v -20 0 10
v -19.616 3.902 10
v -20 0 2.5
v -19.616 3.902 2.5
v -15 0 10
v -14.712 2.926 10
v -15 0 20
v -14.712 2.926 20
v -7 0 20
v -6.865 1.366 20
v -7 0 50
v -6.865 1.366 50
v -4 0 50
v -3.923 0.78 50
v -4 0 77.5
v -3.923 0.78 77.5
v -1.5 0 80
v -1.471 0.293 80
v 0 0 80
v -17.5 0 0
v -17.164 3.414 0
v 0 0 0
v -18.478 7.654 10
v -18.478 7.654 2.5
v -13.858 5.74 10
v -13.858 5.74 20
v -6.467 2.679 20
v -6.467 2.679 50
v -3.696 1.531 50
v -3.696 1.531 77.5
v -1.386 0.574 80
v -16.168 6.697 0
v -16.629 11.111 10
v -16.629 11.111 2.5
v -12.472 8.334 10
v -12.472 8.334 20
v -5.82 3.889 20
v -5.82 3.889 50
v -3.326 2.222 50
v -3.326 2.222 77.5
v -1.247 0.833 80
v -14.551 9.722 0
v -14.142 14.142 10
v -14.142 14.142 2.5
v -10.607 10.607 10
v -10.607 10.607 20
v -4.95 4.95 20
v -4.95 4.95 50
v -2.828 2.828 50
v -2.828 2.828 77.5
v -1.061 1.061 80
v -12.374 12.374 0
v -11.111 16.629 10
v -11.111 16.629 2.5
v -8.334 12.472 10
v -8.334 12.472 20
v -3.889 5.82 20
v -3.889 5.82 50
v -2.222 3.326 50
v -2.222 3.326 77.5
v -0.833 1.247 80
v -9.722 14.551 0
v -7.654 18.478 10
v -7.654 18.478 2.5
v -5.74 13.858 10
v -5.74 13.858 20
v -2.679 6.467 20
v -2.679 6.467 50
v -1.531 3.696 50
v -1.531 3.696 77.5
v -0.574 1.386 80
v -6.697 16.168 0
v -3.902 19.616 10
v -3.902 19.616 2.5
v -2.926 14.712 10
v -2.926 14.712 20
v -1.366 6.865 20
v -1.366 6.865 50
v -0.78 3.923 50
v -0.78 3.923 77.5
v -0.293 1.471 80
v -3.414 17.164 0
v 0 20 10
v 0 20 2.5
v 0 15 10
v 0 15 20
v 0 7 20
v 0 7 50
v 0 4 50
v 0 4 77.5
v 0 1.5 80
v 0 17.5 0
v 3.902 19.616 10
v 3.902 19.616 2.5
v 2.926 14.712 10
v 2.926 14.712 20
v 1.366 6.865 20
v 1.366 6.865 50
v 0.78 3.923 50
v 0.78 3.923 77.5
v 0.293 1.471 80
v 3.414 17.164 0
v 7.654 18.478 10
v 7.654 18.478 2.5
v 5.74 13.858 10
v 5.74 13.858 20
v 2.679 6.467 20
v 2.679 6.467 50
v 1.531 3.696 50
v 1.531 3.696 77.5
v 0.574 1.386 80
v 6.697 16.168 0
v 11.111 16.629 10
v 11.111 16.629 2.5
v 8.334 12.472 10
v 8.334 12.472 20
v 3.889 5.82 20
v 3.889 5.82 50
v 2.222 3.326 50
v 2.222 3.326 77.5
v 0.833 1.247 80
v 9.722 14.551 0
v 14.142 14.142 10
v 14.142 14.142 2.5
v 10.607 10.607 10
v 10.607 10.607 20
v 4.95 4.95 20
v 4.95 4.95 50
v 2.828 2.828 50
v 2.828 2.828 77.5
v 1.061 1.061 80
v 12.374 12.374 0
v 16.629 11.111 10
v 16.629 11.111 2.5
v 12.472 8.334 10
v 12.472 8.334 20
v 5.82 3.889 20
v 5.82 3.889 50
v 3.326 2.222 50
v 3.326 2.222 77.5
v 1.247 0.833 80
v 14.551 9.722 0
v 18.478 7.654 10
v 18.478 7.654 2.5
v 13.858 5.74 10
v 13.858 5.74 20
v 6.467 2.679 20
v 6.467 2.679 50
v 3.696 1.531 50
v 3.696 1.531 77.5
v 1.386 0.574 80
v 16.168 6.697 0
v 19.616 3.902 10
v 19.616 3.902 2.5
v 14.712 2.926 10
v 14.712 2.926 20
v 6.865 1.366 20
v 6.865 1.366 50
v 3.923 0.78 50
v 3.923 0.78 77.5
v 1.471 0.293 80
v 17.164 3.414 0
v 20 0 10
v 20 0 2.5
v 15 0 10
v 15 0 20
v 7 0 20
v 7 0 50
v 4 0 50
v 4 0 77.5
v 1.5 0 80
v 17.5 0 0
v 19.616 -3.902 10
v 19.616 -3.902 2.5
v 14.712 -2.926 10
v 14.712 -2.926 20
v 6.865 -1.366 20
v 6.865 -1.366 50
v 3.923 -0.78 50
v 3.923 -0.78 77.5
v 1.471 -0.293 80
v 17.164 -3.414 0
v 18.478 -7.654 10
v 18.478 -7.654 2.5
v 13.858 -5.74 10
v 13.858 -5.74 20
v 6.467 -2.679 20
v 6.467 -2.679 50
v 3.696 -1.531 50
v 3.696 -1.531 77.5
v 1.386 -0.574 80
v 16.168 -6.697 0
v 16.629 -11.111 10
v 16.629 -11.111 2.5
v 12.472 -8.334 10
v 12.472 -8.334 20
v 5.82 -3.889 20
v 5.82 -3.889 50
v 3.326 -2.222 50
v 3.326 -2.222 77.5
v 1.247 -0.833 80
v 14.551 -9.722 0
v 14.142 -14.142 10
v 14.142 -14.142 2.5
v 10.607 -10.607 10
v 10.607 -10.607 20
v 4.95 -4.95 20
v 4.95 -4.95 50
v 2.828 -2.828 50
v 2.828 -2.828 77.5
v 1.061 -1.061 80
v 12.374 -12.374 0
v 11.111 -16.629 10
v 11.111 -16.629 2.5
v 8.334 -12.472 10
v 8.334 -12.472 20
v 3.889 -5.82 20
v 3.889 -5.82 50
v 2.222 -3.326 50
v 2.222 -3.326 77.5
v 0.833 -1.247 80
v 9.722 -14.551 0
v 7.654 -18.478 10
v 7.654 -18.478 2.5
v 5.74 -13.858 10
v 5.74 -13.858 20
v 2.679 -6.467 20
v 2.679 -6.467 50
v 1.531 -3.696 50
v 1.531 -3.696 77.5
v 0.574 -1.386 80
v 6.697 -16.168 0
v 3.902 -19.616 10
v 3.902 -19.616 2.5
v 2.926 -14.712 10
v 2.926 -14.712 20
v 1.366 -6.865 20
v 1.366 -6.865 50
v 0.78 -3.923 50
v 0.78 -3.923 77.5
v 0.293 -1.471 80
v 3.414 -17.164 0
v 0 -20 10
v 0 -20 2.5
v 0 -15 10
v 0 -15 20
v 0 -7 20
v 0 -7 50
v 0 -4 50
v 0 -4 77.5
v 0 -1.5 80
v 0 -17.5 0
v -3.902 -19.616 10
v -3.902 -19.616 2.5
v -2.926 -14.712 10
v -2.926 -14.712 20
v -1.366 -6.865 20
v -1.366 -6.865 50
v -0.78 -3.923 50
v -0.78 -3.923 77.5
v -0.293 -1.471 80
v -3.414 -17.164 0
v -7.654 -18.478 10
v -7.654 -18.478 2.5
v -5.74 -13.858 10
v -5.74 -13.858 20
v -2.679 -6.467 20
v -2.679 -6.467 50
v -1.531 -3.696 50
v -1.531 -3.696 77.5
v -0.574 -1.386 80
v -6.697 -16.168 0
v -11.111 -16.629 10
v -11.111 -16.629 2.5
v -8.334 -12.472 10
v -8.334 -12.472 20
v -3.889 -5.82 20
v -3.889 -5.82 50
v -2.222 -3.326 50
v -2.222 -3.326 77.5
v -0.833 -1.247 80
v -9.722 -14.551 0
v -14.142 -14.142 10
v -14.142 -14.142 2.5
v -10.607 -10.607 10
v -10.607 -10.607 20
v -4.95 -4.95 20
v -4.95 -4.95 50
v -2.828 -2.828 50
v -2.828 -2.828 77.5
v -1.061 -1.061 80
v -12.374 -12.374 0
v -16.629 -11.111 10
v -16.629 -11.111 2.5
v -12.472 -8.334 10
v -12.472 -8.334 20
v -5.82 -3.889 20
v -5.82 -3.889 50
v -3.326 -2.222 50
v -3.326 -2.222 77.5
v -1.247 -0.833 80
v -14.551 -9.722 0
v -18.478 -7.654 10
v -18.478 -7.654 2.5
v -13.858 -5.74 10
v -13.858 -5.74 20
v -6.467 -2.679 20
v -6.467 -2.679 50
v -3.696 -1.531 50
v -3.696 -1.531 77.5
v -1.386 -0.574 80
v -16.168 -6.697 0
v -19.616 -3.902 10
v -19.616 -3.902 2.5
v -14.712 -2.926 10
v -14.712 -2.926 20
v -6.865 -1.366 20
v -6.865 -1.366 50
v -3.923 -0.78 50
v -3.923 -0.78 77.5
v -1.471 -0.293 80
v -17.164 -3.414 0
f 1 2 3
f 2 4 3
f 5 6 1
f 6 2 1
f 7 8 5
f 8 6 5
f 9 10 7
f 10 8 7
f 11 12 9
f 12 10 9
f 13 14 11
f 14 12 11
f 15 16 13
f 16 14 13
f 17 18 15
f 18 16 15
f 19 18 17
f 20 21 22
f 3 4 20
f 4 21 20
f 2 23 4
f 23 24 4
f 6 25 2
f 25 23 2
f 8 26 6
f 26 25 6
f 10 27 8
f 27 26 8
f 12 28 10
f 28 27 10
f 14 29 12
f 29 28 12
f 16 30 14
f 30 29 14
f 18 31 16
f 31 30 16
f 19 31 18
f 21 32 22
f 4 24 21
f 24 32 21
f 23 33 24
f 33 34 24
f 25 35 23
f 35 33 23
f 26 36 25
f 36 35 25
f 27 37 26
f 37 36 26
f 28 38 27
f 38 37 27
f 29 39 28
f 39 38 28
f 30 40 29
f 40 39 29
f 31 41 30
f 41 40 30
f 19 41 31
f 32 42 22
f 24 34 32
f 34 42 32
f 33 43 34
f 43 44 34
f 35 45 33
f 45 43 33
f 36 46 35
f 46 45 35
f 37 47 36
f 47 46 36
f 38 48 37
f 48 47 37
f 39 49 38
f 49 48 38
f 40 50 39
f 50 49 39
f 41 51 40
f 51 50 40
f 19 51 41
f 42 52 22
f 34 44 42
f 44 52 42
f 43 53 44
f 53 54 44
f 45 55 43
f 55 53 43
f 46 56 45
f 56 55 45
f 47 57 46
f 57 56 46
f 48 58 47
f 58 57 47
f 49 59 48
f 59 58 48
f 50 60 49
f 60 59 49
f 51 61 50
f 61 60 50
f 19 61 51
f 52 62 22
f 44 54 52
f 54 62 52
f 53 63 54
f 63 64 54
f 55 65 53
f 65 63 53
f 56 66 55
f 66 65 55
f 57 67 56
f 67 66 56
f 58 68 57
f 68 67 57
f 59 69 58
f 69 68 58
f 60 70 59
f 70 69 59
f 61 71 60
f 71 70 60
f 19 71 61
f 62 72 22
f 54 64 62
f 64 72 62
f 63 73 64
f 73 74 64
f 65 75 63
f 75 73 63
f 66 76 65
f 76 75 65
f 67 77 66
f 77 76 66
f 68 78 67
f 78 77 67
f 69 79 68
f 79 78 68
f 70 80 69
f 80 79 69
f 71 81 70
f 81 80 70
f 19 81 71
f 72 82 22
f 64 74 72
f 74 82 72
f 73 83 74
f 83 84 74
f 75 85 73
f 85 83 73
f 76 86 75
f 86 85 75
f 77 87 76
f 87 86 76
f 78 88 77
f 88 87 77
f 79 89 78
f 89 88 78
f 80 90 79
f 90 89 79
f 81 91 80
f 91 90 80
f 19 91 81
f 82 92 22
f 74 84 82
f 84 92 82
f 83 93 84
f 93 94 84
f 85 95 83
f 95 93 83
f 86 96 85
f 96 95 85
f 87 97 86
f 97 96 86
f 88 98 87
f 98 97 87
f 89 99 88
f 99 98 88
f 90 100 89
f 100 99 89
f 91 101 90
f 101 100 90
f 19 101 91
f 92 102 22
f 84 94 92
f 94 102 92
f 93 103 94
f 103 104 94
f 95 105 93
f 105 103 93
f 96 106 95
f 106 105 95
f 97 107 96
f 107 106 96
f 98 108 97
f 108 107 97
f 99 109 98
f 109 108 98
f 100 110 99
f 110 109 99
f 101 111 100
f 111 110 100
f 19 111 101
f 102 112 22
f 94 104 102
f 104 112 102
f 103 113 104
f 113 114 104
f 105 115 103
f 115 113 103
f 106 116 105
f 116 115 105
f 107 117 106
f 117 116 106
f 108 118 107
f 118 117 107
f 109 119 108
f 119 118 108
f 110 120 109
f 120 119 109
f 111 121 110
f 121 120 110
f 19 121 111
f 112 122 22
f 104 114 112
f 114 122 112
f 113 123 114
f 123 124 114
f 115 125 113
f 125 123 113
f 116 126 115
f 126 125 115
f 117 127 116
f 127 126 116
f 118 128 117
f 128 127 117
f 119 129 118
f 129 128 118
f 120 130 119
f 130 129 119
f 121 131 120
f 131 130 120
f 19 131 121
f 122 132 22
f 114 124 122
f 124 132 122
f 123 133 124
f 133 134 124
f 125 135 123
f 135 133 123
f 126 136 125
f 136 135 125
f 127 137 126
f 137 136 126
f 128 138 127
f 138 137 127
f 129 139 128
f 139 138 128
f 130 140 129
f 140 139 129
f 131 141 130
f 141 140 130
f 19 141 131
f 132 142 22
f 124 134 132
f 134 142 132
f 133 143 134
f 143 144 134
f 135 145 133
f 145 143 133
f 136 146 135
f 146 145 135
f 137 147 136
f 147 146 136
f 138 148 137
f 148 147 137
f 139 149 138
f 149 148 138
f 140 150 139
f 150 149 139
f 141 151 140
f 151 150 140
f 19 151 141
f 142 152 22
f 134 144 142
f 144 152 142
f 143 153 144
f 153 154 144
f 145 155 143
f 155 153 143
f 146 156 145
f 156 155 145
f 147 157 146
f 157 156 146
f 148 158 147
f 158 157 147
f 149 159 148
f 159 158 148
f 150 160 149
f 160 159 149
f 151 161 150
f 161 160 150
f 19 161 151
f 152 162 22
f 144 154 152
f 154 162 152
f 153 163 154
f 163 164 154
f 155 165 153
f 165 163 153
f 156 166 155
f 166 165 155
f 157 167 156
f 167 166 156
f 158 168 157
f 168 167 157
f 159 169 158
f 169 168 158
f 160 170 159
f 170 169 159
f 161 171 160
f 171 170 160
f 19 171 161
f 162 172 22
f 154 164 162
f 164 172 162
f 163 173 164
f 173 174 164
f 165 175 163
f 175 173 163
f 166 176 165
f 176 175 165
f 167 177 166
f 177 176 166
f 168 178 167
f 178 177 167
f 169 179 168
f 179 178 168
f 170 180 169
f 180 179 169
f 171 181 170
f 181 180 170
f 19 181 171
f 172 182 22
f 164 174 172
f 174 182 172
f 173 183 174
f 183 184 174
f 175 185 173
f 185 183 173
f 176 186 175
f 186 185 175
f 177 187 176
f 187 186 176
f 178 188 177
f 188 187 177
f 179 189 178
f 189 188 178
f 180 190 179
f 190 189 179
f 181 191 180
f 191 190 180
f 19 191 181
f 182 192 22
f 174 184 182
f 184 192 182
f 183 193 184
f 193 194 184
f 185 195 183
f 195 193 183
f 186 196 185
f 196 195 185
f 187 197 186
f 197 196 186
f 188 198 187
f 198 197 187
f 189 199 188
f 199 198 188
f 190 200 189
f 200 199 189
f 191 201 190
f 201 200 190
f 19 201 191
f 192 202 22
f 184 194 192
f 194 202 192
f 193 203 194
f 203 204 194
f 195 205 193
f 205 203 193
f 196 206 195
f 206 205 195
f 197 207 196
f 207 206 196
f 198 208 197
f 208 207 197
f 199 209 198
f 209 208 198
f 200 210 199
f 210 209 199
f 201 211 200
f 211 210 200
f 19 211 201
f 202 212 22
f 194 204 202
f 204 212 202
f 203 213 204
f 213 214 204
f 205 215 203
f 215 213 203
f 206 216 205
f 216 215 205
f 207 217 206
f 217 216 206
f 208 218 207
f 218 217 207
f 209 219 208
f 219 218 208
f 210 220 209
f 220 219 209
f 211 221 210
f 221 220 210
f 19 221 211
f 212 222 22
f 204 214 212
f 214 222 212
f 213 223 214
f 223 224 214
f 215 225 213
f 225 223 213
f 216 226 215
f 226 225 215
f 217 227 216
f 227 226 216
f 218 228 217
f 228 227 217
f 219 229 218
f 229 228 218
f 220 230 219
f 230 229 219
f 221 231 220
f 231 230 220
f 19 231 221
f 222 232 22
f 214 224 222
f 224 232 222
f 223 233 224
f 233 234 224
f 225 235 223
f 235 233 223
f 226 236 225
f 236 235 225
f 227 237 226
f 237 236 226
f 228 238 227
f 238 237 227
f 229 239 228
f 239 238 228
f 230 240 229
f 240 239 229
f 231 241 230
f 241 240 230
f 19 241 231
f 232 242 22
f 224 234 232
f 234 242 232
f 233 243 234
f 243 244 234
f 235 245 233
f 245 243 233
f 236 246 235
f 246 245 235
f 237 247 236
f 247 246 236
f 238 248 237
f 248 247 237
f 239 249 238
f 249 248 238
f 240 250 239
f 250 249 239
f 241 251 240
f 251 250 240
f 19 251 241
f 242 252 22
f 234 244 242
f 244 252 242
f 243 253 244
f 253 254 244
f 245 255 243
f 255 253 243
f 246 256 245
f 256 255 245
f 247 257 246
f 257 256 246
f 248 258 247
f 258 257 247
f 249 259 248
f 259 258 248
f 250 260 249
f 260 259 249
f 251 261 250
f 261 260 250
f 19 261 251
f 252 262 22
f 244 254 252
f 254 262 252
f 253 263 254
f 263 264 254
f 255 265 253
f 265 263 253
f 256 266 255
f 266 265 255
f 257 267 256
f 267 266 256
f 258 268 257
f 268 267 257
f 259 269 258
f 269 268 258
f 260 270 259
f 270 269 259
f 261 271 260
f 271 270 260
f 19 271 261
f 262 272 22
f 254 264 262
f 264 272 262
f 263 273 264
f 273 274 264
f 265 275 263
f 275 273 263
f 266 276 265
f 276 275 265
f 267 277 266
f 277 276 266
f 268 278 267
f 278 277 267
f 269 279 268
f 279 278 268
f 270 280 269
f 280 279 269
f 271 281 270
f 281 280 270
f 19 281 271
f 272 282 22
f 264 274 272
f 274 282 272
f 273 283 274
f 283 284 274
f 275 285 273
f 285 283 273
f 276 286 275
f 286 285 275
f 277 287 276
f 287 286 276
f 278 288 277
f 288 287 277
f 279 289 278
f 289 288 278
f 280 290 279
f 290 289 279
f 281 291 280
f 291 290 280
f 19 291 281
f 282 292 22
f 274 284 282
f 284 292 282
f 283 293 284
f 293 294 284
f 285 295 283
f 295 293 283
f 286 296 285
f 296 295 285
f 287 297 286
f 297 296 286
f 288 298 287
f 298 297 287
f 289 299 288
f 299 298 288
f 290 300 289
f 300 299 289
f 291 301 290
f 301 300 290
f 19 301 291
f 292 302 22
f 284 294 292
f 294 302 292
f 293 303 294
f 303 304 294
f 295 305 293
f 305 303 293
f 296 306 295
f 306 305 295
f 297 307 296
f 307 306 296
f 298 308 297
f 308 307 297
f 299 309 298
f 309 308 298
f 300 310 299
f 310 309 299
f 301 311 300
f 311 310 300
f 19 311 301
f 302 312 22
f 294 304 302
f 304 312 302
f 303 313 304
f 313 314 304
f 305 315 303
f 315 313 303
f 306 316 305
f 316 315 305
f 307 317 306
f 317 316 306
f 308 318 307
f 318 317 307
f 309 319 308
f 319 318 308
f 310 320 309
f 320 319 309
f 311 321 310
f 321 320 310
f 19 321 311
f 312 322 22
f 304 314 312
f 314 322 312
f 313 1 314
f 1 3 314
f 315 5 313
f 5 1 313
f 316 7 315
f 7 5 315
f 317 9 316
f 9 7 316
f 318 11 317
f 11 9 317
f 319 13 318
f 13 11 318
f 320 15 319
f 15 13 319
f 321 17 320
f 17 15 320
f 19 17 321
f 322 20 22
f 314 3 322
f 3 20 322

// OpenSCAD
$fn = 32;

// ----------------------------------------------------------------------
// Stepped shaft: diameters 40, 30, 14, 8 mm, 80 mm long
// ----------------------------------------------------------------------

// --- parameters (mm) ---
d1 = 40;                  // step 1 diameter
len1 = 10;                // step 1 length
d2 = 30;                  // step 2 diameter
len2 = 10;                // step 2 length
d3 = 14;                  // step 3 diameter
len3 = 30;                // step 3 length
d4 = 8;                   // step 4 diameter
len4 = 30;                // step 4 length
total = 80;               // overall length
chamfer = 2.5;            // end chamfer

/* closed turning profile: x is the radius, y is the length */
profile = [[0, 0], [20 - chamfer, 0], [20, chamfer], [20, 10], [15, 10], [15, 20], [7, 20], [7, 50], [4, 50], [4, 77.5], [1.5, 80], [0, 80]];

difference() {
  rotate_extrude() polygon(profile);
}
